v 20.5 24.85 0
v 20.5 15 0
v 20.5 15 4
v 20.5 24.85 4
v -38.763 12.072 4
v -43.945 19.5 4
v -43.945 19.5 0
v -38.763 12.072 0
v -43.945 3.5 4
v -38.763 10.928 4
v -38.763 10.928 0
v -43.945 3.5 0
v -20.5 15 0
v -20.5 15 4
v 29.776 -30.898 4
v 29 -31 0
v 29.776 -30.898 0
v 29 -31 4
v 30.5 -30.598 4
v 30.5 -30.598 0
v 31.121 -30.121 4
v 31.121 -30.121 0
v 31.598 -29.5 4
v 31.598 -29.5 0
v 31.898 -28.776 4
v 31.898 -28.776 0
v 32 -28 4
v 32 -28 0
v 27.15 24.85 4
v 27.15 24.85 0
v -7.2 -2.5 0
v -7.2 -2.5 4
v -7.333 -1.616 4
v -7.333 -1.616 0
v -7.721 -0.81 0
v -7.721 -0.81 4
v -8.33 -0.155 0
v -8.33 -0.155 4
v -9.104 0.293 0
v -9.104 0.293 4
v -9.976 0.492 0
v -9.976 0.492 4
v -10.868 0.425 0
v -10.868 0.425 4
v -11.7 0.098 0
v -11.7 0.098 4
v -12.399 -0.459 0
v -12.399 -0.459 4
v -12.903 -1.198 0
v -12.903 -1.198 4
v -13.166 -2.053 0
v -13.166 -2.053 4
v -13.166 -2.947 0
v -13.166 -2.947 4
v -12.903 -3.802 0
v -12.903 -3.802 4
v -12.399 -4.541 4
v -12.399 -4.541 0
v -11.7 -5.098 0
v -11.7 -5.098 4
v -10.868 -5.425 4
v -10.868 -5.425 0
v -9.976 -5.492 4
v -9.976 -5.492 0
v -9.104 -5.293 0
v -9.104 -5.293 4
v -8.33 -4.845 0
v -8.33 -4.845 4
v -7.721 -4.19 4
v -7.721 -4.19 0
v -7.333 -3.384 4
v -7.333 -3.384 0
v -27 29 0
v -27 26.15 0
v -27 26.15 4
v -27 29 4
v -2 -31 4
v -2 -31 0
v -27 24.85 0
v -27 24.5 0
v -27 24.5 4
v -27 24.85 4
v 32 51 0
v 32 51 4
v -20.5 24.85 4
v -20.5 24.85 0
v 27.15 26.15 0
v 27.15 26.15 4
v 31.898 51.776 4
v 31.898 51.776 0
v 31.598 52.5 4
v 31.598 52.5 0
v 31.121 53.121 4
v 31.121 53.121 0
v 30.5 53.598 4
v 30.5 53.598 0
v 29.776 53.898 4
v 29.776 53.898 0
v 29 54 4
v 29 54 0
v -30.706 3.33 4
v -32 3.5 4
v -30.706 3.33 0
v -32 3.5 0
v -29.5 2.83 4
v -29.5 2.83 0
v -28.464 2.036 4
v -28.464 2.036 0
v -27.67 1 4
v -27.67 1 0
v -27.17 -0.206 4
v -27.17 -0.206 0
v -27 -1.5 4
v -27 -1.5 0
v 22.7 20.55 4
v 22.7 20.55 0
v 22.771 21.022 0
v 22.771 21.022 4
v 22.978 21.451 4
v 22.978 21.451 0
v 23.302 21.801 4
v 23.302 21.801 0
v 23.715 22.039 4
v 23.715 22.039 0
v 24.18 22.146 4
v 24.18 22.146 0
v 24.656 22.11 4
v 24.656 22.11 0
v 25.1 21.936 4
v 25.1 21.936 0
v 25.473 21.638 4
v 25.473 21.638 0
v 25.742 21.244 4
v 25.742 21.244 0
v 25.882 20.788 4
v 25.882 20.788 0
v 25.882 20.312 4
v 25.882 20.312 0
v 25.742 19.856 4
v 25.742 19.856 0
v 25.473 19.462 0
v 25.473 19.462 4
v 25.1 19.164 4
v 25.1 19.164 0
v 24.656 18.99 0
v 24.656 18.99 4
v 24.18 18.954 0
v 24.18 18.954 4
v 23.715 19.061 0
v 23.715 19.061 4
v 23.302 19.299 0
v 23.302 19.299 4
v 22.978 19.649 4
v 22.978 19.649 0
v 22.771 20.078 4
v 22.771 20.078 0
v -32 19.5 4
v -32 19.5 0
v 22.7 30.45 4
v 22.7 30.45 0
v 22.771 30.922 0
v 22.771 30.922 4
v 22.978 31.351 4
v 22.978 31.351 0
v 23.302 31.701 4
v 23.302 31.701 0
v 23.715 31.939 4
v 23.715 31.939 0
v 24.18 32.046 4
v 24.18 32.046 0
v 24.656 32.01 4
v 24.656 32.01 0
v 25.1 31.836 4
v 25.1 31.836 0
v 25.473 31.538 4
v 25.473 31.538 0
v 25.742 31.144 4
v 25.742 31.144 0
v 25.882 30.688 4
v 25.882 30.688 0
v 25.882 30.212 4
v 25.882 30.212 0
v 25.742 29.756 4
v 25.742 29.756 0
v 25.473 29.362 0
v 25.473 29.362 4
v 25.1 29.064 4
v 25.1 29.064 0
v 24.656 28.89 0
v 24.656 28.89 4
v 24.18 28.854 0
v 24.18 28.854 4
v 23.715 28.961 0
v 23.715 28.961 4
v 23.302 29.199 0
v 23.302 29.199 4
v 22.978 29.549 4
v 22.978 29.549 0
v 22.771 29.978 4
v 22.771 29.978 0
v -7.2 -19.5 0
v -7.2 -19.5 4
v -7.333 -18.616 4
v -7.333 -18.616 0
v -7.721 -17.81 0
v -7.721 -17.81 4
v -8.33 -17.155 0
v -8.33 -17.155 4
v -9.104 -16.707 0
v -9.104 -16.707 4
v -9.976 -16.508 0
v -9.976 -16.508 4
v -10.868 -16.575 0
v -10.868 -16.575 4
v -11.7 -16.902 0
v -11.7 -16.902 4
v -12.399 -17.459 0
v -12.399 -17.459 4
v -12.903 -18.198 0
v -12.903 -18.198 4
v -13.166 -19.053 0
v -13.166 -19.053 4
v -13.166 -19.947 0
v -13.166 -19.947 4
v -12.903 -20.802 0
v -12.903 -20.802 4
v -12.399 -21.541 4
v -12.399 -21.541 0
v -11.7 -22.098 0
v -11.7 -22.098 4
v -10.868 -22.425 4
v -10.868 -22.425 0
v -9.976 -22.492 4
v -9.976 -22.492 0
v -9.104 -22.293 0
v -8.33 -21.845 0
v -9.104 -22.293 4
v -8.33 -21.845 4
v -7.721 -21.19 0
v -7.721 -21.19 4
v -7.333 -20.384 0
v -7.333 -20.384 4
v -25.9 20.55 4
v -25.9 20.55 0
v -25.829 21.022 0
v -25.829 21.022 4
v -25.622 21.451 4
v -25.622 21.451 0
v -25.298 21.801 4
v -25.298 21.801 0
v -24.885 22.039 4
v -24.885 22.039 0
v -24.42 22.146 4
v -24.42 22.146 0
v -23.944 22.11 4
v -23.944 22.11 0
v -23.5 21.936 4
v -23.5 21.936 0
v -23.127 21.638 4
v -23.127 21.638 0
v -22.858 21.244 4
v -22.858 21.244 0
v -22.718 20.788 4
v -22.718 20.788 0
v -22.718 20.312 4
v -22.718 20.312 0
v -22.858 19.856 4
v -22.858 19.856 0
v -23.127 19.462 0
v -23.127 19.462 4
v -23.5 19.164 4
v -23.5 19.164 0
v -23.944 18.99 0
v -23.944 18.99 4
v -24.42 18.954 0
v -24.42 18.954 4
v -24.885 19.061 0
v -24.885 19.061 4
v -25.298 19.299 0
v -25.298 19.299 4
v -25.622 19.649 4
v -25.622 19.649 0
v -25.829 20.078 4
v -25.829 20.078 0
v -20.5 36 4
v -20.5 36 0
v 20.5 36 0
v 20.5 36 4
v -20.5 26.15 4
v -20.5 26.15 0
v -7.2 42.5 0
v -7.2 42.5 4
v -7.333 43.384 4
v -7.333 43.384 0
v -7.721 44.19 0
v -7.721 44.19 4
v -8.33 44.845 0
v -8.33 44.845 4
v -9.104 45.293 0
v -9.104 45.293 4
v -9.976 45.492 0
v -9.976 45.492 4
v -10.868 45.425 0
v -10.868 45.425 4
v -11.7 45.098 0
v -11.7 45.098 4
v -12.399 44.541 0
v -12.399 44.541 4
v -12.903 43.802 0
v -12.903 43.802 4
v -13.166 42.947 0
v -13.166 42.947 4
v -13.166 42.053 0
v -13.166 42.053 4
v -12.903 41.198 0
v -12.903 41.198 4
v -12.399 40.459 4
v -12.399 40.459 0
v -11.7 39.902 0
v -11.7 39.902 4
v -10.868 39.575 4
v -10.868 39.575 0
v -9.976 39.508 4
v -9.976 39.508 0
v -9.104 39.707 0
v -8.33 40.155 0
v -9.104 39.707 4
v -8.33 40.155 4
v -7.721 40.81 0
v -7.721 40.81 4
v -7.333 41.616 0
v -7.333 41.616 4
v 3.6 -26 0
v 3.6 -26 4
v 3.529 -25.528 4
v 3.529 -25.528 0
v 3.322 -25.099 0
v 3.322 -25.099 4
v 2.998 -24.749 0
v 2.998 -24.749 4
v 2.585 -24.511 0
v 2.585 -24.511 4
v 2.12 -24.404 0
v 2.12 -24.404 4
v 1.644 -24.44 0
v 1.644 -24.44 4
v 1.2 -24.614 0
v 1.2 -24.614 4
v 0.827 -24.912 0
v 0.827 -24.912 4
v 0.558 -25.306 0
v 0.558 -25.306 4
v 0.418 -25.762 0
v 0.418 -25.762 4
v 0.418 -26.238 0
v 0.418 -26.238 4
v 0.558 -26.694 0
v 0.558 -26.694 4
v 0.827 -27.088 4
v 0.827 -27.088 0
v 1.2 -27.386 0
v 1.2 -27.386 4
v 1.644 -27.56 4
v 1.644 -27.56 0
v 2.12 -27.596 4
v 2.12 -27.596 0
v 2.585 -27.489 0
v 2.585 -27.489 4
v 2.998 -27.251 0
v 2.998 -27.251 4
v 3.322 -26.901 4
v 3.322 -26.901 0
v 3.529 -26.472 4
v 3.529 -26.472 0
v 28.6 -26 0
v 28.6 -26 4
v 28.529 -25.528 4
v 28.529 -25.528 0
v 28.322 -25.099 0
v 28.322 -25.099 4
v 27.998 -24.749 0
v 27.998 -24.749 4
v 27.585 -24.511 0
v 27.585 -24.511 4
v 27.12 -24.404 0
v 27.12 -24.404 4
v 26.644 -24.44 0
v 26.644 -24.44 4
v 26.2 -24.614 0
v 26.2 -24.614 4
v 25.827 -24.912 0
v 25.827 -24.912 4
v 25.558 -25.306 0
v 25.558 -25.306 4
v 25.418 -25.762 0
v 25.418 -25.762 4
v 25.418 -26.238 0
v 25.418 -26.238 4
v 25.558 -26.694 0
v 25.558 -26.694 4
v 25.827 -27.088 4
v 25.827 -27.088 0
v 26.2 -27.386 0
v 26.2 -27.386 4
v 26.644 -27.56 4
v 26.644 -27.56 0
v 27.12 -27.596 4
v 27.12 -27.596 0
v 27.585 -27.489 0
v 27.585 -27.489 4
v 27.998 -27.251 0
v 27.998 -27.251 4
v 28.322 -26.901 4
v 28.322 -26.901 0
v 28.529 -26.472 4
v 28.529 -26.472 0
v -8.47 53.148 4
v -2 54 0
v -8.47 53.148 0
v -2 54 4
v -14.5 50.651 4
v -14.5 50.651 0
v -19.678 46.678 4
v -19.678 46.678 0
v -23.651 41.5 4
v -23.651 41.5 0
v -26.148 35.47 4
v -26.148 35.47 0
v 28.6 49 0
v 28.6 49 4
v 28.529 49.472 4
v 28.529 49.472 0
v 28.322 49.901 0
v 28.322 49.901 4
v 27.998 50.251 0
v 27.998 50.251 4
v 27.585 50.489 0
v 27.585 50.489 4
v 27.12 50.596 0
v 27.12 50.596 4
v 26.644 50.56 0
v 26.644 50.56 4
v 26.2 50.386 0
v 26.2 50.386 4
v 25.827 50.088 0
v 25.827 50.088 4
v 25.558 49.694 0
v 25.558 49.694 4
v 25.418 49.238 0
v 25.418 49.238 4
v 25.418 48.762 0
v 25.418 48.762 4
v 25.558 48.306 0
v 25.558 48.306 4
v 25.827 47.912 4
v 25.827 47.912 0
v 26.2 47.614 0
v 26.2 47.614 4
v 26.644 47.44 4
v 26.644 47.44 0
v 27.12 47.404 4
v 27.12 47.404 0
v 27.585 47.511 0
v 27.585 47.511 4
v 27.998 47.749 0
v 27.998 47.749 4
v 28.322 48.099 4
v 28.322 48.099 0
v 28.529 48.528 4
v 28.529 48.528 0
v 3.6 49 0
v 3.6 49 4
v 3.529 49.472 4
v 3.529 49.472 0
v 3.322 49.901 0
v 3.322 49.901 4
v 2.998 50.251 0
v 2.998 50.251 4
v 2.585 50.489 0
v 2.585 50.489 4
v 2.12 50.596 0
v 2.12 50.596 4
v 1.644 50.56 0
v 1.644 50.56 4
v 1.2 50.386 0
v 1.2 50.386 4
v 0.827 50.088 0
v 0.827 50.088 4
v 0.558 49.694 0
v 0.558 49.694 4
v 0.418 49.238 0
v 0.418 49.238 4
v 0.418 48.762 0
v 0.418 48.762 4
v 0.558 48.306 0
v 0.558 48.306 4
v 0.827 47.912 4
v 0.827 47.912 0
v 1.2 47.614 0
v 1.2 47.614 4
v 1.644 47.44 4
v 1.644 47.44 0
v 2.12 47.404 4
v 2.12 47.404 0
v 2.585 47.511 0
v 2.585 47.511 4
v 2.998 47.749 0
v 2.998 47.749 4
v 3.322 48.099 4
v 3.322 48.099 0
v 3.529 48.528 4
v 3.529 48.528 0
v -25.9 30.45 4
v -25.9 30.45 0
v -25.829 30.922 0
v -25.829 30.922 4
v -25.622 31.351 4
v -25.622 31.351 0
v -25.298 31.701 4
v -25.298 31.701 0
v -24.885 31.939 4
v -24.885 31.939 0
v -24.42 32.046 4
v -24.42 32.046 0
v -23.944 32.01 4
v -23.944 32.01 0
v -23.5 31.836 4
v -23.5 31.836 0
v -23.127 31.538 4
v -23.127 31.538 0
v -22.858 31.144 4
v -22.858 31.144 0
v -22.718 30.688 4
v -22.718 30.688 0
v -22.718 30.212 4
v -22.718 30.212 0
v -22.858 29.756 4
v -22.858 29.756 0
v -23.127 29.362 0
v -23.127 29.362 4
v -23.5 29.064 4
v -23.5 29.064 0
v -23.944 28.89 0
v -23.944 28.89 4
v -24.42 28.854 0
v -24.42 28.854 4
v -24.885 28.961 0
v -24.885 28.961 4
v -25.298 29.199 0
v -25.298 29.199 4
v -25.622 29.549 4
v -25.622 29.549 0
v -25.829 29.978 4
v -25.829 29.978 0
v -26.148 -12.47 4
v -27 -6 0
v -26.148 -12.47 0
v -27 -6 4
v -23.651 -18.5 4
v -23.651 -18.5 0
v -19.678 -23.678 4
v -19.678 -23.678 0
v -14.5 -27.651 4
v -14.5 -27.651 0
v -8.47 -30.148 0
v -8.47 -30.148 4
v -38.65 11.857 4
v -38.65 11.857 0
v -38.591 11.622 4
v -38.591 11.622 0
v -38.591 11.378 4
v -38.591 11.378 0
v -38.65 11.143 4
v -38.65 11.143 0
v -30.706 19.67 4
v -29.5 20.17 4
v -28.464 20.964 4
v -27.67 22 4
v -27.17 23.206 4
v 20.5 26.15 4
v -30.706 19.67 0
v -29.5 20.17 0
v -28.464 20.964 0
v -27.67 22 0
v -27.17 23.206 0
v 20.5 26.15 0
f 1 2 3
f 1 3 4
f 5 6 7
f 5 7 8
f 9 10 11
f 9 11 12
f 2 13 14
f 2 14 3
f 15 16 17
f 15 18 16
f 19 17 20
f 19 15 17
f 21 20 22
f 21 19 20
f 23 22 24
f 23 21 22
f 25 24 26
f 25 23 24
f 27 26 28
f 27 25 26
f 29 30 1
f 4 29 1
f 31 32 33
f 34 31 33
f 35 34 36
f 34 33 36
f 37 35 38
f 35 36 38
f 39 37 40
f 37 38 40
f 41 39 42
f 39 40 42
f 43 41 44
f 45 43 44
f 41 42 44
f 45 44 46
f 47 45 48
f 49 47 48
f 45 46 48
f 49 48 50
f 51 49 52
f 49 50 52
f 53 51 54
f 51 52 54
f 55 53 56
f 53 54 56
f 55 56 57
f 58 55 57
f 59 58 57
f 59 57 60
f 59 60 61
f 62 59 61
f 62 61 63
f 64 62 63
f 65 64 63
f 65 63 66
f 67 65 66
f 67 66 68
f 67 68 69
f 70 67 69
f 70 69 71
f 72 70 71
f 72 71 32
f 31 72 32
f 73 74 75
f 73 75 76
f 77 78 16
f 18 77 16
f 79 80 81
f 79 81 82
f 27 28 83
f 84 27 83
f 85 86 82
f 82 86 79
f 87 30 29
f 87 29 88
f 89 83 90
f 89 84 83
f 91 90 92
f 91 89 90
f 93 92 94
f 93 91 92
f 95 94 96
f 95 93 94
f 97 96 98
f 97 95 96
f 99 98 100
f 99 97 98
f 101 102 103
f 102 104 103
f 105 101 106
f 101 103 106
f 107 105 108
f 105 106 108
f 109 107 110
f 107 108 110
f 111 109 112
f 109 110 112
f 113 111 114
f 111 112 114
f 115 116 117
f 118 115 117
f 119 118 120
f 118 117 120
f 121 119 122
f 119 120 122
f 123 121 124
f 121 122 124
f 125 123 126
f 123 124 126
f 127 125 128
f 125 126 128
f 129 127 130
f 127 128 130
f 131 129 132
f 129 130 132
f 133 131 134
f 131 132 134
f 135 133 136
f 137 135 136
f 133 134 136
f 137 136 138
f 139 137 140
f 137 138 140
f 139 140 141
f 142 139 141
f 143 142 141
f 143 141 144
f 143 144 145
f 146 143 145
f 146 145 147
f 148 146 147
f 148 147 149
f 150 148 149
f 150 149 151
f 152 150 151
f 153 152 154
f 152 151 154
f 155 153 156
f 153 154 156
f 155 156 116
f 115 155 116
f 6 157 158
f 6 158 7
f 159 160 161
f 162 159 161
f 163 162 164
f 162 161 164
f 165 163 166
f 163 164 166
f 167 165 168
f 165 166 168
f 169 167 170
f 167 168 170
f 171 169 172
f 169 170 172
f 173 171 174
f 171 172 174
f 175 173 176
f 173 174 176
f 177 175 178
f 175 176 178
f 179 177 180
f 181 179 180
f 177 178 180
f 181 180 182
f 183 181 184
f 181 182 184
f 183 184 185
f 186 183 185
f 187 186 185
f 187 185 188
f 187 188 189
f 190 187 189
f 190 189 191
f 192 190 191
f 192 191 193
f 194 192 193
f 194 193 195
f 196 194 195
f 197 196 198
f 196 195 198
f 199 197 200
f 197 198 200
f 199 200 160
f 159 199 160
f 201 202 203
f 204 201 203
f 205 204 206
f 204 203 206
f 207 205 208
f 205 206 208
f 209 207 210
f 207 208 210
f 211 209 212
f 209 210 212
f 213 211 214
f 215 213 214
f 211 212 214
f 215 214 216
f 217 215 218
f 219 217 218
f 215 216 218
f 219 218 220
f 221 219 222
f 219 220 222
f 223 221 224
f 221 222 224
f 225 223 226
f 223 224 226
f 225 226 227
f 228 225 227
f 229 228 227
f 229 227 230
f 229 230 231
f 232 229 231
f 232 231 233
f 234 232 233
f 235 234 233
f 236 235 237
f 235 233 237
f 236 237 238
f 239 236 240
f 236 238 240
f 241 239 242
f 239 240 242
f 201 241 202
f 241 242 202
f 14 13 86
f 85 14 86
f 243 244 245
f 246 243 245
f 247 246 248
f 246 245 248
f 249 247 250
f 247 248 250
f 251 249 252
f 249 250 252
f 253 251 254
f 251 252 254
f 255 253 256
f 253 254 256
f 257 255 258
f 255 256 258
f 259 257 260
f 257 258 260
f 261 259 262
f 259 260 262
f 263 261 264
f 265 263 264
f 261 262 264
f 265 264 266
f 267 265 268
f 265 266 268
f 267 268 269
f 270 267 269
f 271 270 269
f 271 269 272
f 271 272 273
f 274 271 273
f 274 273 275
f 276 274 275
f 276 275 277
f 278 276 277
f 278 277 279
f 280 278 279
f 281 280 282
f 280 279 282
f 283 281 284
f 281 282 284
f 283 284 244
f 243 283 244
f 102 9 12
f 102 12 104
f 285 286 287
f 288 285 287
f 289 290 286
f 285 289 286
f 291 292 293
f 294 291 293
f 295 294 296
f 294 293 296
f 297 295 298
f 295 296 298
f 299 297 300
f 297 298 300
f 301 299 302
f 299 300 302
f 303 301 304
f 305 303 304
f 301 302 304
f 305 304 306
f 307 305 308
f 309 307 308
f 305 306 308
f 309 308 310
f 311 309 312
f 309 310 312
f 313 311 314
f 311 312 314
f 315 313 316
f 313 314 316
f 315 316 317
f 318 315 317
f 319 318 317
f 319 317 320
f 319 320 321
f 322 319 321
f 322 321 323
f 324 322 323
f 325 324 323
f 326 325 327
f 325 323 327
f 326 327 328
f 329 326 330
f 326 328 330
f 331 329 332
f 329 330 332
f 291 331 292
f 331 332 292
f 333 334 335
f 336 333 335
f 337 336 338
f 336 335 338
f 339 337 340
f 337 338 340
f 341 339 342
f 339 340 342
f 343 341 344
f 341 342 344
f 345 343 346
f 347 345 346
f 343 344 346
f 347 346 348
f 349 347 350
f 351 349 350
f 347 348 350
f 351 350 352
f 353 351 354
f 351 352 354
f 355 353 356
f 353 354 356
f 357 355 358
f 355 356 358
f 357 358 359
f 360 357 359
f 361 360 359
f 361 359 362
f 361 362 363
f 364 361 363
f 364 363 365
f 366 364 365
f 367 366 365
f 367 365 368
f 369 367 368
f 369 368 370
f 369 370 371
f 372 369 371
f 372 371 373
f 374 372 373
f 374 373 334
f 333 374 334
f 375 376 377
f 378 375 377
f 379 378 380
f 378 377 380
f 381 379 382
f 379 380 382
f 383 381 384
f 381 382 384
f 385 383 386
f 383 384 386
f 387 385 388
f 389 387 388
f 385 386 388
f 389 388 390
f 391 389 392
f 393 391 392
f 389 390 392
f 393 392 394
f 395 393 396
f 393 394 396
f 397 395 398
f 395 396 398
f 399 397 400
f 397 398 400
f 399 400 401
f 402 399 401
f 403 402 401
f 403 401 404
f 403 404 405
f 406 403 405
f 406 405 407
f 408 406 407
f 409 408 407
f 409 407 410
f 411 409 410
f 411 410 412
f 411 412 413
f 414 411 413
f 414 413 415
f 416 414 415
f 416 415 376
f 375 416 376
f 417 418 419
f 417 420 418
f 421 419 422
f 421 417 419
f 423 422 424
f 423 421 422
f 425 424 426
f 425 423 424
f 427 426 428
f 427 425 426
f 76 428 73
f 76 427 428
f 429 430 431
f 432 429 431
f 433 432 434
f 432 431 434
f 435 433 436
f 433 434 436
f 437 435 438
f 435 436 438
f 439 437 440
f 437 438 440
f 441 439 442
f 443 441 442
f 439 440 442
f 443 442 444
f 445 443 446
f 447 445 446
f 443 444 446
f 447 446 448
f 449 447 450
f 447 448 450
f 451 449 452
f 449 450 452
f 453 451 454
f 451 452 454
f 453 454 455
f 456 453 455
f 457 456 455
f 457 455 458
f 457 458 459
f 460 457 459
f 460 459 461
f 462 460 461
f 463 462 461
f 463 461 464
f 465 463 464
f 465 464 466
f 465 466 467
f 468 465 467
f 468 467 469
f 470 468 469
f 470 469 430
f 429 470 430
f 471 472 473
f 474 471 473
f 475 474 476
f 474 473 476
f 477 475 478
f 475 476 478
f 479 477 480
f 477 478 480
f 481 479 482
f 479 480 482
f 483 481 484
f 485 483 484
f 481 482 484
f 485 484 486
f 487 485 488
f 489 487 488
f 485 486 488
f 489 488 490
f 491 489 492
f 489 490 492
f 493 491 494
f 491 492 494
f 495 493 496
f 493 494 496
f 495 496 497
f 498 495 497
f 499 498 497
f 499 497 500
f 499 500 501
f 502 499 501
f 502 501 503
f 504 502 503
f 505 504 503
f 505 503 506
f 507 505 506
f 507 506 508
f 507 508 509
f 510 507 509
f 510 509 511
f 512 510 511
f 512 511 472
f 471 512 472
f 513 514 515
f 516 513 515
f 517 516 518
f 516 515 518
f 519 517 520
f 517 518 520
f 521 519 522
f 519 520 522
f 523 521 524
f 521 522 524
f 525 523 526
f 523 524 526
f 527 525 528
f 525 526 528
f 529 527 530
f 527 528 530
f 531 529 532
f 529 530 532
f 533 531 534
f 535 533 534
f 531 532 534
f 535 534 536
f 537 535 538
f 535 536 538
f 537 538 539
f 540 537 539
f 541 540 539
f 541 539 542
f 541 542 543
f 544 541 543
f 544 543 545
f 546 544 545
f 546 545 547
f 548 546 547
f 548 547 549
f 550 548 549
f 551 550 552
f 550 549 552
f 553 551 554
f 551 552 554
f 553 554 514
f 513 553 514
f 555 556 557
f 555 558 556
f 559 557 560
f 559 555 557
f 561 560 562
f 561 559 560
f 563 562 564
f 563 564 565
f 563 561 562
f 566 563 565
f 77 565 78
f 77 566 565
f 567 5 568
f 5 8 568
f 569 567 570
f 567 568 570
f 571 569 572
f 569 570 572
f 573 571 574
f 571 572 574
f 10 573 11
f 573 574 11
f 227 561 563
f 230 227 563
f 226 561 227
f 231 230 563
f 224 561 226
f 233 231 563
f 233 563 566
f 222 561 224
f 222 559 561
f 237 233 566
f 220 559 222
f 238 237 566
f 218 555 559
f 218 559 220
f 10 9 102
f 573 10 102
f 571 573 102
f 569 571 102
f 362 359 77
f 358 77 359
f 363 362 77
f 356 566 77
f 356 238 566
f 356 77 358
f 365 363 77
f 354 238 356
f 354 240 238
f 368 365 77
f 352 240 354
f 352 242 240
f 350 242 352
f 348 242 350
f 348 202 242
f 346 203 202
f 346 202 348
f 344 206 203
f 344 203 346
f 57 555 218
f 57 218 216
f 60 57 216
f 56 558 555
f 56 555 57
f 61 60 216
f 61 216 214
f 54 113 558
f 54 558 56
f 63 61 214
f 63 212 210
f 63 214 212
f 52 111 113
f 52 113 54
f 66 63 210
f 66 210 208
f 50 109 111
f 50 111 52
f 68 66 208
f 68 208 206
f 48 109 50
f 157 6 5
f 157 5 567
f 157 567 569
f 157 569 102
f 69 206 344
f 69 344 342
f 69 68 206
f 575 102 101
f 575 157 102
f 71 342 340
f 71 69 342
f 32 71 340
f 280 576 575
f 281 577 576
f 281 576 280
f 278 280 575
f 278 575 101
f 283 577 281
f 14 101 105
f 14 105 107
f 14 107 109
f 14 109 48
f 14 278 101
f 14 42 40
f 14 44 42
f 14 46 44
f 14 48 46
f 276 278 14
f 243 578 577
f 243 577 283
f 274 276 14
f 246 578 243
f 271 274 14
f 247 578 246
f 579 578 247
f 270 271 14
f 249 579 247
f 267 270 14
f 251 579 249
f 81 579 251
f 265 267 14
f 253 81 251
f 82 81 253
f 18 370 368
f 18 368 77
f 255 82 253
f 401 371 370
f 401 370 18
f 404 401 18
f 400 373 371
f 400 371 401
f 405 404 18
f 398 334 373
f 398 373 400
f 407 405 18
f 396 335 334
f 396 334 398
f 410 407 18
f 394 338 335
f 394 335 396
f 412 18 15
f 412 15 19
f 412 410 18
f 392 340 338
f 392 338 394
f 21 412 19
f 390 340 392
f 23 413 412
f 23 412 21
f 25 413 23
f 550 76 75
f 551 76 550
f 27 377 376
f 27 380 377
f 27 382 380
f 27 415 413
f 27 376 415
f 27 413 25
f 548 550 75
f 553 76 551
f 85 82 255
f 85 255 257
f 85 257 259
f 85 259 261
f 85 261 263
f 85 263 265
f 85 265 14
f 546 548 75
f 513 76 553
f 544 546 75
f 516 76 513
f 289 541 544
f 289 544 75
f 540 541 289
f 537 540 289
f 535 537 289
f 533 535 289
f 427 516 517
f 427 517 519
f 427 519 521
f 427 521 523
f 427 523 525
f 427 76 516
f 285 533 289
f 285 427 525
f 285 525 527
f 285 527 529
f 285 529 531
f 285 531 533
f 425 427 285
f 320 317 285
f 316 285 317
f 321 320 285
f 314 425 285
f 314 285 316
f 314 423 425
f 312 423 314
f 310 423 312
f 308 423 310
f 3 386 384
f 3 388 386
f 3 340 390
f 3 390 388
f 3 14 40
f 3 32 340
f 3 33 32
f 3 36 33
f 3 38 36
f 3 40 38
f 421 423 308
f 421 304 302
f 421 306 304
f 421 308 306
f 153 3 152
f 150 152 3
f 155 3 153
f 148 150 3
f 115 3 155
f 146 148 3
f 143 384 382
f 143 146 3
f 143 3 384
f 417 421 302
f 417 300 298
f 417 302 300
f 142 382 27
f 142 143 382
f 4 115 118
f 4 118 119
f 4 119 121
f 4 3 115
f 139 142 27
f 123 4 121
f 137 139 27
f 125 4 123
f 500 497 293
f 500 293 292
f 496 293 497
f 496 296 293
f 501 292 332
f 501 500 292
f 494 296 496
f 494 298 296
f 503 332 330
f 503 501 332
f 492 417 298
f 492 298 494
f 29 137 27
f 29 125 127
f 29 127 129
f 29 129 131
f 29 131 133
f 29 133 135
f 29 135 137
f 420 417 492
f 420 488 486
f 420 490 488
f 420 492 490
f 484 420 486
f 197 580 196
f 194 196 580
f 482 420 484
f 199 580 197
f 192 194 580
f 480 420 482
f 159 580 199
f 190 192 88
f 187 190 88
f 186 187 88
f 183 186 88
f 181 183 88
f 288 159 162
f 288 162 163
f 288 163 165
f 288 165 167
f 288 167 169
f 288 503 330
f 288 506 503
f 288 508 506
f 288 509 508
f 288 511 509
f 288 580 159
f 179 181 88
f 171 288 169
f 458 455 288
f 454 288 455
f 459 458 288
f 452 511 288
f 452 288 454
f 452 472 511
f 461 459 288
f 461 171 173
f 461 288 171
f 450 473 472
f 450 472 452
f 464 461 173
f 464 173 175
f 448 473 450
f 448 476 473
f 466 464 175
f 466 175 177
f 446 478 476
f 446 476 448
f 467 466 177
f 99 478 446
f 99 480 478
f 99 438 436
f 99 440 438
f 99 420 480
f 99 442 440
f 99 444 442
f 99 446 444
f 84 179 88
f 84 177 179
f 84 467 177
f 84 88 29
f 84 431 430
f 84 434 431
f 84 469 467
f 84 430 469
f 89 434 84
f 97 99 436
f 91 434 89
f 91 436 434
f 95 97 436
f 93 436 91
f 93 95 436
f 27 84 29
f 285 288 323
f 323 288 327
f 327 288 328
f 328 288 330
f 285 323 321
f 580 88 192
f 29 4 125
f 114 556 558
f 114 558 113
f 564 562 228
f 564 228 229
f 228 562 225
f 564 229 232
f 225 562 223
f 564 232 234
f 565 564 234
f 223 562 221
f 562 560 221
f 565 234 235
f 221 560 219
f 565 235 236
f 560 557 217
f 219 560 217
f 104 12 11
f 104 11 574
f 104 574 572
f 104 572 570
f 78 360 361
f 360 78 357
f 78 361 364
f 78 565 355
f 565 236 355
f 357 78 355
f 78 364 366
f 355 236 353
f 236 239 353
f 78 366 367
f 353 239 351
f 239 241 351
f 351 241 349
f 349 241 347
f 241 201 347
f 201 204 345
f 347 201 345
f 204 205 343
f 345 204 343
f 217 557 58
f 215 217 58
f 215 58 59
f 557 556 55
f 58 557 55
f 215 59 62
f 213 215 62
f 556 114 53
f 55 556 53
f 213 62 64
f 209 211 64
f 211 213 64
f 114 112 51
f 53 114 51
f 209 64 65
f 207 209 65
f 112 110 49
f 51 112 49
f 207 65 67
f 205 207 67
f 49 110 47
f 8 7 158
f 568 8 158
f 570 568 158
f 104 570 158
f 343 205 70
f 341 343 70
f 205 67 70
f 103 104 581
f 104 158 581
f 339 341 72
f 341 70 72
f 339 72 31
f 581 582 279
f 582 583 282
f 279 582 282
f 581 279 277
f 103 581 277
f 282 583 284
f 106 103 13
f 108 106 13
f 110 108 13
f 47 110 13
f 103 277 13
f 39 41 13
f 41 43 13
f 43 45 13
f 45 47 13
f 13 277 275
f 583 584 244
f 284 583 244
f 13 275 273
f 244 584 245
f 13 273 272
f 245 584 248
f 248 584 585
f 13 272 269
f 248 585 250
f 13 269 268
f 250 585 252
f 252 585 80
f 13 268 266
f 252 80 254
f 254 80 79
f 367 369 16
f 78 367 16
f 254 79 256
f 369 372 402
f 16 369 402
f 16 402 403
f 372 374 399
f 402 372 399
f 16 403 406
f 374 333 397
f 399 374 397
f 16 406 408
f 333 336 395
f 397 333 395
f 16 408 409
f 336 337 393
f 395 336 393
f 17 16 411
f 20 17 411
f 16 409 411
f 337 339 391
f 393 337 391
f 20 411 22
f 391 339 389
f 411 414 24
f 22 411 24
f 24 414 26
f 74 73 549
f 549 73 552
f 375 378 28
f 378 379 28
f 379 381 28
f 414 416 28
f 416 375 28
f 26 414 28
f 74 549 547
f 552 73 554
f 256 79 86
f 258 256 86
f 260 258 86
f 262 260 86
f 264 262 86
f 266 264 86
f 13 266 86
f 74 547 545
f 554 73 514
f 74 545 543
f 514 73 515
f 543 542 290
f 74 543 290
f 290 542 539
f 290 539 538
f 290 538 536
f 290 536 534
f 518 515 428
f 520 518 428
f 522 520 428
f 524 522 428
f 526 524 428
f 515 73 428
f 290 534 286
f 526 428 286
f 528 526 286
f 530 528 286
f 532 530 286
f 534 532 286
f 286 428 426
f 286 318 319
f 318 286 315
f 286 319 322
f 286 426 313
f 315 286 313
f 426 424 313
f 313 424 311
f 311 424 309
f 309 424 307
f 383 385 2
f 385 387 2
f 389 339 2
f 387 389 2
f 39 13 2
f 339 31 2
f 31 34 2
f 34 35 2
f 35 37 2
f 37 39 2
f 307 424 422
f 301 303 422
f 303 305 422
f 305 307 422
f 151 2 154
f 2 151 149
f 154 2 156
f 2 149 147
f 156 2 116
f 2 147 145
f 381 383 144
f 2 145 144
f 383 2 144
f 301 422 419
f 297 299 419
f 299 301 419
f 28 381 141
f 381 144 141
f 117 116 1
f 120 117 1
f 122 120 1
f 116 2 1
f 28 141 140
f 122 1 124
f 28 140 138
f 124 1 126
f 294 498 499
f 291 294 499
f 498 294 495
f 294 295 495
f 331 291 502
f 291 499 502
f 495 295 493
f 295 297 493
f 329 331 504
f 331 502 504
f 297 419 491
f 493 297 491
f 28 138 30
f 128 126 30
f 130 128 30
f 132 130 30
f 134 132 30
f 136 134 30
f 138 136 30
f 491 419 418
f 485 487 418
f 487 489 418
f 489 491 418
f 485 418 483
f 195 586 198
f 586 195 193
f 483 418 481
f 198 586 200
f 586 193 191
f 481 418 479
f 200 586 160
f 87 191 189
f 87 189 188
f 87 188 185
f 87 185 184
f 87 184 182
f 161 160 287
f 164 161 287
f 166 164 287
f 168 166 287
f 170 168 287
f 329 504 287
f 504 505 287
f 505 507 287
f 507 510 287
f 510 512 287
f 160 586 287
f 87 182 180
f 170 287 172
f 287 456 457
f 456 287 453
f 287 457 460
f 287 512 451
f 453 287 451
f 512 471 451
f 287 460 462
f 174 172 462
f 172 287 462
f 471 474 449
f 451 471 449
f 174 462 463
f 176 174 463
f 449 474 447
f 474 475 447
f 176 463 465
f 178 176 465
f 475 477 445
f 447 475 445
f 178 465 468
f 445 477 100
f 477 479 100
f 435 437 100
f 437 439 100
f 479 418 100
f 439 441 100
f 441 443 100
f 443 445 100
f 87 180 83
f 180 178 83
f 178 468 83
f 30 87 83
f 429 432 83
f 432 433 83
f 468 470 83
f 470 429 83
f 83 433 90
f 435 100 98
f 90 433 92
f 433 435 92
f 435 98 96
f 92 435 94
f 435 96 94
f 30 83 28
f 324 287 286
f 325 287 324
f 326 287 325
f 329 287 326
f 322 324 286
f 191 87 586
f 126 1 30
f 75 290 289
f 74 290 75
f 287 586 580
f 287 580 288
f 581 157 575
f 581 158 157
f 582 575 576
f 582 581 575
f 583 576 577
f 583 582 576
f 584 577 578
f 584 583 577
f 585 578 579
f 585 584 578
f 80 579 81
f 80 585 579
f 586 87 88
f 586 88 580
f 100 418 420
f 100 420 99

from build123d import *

# Parameters (mm, degrees)
SKETCH_1_W          = 59
SKETCH_1_H          = 85
SKETCH_1_W_2        = 41
SKETCH_1_H_2        = 21
EXTRUDE_1_DEPTH     = 4
SKETCH_2_R          = 1.6
SKETCH_2_W          = 6.65
SKETCH_2_H          = 1.3
CUT_EXTRUDE_1_DEPTH = 4
SKETCH_5_R          = 3
CUT_EXTRUDE_4_DEPTH = 10
SKETCH_3_R          = 3
CUT_EXTRUDE_2_DEPTH = 4
FILLET_1_R          = 25
FILLET_2_R          = 3
SKETCH_4_R          = 1.6
CUT_EXTRUDE_3_DEPTH = 10
EXTRUDE_2_DEPTH     = 4
FILLET_3_R          = 1
FILLET_4_R          = 5
SKETCH_8_R          = 1.6
CUT_EXTRUDE_5_DEPTH = 10


with BuildPart() as part:
    # ｽｹｯﾁ1 → ﾎﾞｽ - 押し出し1 (new body)
    with BuildSketch(Plane.XY):
        with Locations((2.5, 11.5)):
            Rectangle(SKETCH_1_W, SKETCH_1_H)
        with Locations((0, 25.5)):
            Rectangle(SKETCH_1_W_2, SKETCH_1_H_2, mode=Mode.SUBTRACT)
    extrude(amount=EXTRUDE_1_DEPTH)

    # ｽｹｯﾁ2 → ｶｯﾄ - 押し出し1 (cut)
    with BuildSketch(Plane(origin=(0, 0, 0), x_dir=(-1, 0, 0), z_dir=(0, 0, -1))):
        with Locations((-24.3, 20.55)):
            Circle(SKETCH_2_R)
        with Locations((-24.3, 30.45)):
            Circle(SKETCH_2_R)
        with Locations((24.3, 30.45)):
            Circle(SKETCH_2_R)
        with Locations((24.3, 20.55)):
            Circle(SKETCH_2_R)
        with Locations((-23.825, 25.5)):
            Rectangle(SKETCH_2_W, SKETCH_2_H)
        with Locations((23.825, 25.5)):
            Rectangle(SKETCH_2_W, SKETCH_2_H)
    extrude(amount=-CUT_EXTRUDE_1_DEPTH, mode=Mode.SUBTRACT)

    # ｽｹｯﾁ5 → ｶｯﾄ - 押し出し4 (cut)
    with BuildSketch(Plane.XY.offset(4)):
        with Locations((-10.2, -2.5)):
            Circle(SKETCH_5_R)
    extrude(amount=-CUT_EXTRUDE_4_DEPTH, mode=Mode.SUBTRACT)

    # ｽｹｯﾁ3 → ｶｯﾄ - 押し出し2 (cut)
    with BuildSketch(Plane.XY.offset(4)):
        with Locations((-10.2, 42.5)):
            Circle(SKETCH_3_R)
        with Locations((-10.2, -19.5)):
            Circle(SKETCH_3_R)
    extrude(amount=-CUT_EXTRUDE_2_DEPTH, mode=Mode.SUBTRACT)

    # ﾌｨﾚｯﾄ1
    fillet_1_edges = [part.edges().sort_by_distance(p)[0] for p in [
        (-27, 54, 2),
        (-27, -31, 2),
    ]]
    fillet(fillet_1_edges, radius=FILLET_1_R)

    # ﾌｨﾚｯﾄ2
    fillet_2_edges = [part.edges().sort_by_distance(p)[0] for p in [
        (32, 54, 2),
        (32, -31, 2),
    ]]
    fillet(fillet_2_edges, radius=FILLET_2_R)

    # ｽｹｯﾁ4 → ｶｯﾄ - 押し出し3 (cut)
    with BuildSketch(Plane.XY.offset(4)):
        with Locations((27, 49)):
            Circle(SKETCH_4_R)
        with Locations((27, -26)):
            Circle(SKETCH_4_R)
    extrude(amount=-CUT_EXTRUDE_3_DEPTH, mode=Mode.SUBTRACT)

    # ｽｹｯﾁ6 → ﾎﾞｽ - 押し出し2 (add)
    with BuildSketch(Plane.XY.offset(4)):
        Polygon((-27, 19.5), (-43.945270358, 19.5), (-38.364198183, 11.5), (-43.945270358, 3.5), (-27, 3.5), align=None)
    extrude(amount=-EXTRUDE_2_DEPTH)

    # ﾌｨﾚｯﾄ3
    fillet_3_edges = [part.edges().sort_by_distance(p)[0] for p in [
        (-38.364198183, 11.5, 2),
    ]]
    fillet(fillet_3_edges, radius=FILLET_3_R)

    # ﾌｨﾚｯﾄ4
    fillet_4_edges = [part.edges().sort_by_distance(p)[0] for p in [
        (-27, 19.5, 2),
        (-27, 3.5, 2),
    ]]
    fillet(fillet_4_edges, radius=FILLET_4_R)

    # ｽｹｯﾁ8 → ｶｯﾄ - 押し出し5 (cut)
    with BuildSketch(Plane.XY.offset(4)):
        with Locations((2, -26)):
            Circle(SKETCH_8_R)
        with Locations((2, 49)):
            Circle(SKETCH_8_R)
    extrude(amount=-CUT_EXTRUDE_5_DEPTH, mode=Mode.SUBTRACT)


solid = part.part
